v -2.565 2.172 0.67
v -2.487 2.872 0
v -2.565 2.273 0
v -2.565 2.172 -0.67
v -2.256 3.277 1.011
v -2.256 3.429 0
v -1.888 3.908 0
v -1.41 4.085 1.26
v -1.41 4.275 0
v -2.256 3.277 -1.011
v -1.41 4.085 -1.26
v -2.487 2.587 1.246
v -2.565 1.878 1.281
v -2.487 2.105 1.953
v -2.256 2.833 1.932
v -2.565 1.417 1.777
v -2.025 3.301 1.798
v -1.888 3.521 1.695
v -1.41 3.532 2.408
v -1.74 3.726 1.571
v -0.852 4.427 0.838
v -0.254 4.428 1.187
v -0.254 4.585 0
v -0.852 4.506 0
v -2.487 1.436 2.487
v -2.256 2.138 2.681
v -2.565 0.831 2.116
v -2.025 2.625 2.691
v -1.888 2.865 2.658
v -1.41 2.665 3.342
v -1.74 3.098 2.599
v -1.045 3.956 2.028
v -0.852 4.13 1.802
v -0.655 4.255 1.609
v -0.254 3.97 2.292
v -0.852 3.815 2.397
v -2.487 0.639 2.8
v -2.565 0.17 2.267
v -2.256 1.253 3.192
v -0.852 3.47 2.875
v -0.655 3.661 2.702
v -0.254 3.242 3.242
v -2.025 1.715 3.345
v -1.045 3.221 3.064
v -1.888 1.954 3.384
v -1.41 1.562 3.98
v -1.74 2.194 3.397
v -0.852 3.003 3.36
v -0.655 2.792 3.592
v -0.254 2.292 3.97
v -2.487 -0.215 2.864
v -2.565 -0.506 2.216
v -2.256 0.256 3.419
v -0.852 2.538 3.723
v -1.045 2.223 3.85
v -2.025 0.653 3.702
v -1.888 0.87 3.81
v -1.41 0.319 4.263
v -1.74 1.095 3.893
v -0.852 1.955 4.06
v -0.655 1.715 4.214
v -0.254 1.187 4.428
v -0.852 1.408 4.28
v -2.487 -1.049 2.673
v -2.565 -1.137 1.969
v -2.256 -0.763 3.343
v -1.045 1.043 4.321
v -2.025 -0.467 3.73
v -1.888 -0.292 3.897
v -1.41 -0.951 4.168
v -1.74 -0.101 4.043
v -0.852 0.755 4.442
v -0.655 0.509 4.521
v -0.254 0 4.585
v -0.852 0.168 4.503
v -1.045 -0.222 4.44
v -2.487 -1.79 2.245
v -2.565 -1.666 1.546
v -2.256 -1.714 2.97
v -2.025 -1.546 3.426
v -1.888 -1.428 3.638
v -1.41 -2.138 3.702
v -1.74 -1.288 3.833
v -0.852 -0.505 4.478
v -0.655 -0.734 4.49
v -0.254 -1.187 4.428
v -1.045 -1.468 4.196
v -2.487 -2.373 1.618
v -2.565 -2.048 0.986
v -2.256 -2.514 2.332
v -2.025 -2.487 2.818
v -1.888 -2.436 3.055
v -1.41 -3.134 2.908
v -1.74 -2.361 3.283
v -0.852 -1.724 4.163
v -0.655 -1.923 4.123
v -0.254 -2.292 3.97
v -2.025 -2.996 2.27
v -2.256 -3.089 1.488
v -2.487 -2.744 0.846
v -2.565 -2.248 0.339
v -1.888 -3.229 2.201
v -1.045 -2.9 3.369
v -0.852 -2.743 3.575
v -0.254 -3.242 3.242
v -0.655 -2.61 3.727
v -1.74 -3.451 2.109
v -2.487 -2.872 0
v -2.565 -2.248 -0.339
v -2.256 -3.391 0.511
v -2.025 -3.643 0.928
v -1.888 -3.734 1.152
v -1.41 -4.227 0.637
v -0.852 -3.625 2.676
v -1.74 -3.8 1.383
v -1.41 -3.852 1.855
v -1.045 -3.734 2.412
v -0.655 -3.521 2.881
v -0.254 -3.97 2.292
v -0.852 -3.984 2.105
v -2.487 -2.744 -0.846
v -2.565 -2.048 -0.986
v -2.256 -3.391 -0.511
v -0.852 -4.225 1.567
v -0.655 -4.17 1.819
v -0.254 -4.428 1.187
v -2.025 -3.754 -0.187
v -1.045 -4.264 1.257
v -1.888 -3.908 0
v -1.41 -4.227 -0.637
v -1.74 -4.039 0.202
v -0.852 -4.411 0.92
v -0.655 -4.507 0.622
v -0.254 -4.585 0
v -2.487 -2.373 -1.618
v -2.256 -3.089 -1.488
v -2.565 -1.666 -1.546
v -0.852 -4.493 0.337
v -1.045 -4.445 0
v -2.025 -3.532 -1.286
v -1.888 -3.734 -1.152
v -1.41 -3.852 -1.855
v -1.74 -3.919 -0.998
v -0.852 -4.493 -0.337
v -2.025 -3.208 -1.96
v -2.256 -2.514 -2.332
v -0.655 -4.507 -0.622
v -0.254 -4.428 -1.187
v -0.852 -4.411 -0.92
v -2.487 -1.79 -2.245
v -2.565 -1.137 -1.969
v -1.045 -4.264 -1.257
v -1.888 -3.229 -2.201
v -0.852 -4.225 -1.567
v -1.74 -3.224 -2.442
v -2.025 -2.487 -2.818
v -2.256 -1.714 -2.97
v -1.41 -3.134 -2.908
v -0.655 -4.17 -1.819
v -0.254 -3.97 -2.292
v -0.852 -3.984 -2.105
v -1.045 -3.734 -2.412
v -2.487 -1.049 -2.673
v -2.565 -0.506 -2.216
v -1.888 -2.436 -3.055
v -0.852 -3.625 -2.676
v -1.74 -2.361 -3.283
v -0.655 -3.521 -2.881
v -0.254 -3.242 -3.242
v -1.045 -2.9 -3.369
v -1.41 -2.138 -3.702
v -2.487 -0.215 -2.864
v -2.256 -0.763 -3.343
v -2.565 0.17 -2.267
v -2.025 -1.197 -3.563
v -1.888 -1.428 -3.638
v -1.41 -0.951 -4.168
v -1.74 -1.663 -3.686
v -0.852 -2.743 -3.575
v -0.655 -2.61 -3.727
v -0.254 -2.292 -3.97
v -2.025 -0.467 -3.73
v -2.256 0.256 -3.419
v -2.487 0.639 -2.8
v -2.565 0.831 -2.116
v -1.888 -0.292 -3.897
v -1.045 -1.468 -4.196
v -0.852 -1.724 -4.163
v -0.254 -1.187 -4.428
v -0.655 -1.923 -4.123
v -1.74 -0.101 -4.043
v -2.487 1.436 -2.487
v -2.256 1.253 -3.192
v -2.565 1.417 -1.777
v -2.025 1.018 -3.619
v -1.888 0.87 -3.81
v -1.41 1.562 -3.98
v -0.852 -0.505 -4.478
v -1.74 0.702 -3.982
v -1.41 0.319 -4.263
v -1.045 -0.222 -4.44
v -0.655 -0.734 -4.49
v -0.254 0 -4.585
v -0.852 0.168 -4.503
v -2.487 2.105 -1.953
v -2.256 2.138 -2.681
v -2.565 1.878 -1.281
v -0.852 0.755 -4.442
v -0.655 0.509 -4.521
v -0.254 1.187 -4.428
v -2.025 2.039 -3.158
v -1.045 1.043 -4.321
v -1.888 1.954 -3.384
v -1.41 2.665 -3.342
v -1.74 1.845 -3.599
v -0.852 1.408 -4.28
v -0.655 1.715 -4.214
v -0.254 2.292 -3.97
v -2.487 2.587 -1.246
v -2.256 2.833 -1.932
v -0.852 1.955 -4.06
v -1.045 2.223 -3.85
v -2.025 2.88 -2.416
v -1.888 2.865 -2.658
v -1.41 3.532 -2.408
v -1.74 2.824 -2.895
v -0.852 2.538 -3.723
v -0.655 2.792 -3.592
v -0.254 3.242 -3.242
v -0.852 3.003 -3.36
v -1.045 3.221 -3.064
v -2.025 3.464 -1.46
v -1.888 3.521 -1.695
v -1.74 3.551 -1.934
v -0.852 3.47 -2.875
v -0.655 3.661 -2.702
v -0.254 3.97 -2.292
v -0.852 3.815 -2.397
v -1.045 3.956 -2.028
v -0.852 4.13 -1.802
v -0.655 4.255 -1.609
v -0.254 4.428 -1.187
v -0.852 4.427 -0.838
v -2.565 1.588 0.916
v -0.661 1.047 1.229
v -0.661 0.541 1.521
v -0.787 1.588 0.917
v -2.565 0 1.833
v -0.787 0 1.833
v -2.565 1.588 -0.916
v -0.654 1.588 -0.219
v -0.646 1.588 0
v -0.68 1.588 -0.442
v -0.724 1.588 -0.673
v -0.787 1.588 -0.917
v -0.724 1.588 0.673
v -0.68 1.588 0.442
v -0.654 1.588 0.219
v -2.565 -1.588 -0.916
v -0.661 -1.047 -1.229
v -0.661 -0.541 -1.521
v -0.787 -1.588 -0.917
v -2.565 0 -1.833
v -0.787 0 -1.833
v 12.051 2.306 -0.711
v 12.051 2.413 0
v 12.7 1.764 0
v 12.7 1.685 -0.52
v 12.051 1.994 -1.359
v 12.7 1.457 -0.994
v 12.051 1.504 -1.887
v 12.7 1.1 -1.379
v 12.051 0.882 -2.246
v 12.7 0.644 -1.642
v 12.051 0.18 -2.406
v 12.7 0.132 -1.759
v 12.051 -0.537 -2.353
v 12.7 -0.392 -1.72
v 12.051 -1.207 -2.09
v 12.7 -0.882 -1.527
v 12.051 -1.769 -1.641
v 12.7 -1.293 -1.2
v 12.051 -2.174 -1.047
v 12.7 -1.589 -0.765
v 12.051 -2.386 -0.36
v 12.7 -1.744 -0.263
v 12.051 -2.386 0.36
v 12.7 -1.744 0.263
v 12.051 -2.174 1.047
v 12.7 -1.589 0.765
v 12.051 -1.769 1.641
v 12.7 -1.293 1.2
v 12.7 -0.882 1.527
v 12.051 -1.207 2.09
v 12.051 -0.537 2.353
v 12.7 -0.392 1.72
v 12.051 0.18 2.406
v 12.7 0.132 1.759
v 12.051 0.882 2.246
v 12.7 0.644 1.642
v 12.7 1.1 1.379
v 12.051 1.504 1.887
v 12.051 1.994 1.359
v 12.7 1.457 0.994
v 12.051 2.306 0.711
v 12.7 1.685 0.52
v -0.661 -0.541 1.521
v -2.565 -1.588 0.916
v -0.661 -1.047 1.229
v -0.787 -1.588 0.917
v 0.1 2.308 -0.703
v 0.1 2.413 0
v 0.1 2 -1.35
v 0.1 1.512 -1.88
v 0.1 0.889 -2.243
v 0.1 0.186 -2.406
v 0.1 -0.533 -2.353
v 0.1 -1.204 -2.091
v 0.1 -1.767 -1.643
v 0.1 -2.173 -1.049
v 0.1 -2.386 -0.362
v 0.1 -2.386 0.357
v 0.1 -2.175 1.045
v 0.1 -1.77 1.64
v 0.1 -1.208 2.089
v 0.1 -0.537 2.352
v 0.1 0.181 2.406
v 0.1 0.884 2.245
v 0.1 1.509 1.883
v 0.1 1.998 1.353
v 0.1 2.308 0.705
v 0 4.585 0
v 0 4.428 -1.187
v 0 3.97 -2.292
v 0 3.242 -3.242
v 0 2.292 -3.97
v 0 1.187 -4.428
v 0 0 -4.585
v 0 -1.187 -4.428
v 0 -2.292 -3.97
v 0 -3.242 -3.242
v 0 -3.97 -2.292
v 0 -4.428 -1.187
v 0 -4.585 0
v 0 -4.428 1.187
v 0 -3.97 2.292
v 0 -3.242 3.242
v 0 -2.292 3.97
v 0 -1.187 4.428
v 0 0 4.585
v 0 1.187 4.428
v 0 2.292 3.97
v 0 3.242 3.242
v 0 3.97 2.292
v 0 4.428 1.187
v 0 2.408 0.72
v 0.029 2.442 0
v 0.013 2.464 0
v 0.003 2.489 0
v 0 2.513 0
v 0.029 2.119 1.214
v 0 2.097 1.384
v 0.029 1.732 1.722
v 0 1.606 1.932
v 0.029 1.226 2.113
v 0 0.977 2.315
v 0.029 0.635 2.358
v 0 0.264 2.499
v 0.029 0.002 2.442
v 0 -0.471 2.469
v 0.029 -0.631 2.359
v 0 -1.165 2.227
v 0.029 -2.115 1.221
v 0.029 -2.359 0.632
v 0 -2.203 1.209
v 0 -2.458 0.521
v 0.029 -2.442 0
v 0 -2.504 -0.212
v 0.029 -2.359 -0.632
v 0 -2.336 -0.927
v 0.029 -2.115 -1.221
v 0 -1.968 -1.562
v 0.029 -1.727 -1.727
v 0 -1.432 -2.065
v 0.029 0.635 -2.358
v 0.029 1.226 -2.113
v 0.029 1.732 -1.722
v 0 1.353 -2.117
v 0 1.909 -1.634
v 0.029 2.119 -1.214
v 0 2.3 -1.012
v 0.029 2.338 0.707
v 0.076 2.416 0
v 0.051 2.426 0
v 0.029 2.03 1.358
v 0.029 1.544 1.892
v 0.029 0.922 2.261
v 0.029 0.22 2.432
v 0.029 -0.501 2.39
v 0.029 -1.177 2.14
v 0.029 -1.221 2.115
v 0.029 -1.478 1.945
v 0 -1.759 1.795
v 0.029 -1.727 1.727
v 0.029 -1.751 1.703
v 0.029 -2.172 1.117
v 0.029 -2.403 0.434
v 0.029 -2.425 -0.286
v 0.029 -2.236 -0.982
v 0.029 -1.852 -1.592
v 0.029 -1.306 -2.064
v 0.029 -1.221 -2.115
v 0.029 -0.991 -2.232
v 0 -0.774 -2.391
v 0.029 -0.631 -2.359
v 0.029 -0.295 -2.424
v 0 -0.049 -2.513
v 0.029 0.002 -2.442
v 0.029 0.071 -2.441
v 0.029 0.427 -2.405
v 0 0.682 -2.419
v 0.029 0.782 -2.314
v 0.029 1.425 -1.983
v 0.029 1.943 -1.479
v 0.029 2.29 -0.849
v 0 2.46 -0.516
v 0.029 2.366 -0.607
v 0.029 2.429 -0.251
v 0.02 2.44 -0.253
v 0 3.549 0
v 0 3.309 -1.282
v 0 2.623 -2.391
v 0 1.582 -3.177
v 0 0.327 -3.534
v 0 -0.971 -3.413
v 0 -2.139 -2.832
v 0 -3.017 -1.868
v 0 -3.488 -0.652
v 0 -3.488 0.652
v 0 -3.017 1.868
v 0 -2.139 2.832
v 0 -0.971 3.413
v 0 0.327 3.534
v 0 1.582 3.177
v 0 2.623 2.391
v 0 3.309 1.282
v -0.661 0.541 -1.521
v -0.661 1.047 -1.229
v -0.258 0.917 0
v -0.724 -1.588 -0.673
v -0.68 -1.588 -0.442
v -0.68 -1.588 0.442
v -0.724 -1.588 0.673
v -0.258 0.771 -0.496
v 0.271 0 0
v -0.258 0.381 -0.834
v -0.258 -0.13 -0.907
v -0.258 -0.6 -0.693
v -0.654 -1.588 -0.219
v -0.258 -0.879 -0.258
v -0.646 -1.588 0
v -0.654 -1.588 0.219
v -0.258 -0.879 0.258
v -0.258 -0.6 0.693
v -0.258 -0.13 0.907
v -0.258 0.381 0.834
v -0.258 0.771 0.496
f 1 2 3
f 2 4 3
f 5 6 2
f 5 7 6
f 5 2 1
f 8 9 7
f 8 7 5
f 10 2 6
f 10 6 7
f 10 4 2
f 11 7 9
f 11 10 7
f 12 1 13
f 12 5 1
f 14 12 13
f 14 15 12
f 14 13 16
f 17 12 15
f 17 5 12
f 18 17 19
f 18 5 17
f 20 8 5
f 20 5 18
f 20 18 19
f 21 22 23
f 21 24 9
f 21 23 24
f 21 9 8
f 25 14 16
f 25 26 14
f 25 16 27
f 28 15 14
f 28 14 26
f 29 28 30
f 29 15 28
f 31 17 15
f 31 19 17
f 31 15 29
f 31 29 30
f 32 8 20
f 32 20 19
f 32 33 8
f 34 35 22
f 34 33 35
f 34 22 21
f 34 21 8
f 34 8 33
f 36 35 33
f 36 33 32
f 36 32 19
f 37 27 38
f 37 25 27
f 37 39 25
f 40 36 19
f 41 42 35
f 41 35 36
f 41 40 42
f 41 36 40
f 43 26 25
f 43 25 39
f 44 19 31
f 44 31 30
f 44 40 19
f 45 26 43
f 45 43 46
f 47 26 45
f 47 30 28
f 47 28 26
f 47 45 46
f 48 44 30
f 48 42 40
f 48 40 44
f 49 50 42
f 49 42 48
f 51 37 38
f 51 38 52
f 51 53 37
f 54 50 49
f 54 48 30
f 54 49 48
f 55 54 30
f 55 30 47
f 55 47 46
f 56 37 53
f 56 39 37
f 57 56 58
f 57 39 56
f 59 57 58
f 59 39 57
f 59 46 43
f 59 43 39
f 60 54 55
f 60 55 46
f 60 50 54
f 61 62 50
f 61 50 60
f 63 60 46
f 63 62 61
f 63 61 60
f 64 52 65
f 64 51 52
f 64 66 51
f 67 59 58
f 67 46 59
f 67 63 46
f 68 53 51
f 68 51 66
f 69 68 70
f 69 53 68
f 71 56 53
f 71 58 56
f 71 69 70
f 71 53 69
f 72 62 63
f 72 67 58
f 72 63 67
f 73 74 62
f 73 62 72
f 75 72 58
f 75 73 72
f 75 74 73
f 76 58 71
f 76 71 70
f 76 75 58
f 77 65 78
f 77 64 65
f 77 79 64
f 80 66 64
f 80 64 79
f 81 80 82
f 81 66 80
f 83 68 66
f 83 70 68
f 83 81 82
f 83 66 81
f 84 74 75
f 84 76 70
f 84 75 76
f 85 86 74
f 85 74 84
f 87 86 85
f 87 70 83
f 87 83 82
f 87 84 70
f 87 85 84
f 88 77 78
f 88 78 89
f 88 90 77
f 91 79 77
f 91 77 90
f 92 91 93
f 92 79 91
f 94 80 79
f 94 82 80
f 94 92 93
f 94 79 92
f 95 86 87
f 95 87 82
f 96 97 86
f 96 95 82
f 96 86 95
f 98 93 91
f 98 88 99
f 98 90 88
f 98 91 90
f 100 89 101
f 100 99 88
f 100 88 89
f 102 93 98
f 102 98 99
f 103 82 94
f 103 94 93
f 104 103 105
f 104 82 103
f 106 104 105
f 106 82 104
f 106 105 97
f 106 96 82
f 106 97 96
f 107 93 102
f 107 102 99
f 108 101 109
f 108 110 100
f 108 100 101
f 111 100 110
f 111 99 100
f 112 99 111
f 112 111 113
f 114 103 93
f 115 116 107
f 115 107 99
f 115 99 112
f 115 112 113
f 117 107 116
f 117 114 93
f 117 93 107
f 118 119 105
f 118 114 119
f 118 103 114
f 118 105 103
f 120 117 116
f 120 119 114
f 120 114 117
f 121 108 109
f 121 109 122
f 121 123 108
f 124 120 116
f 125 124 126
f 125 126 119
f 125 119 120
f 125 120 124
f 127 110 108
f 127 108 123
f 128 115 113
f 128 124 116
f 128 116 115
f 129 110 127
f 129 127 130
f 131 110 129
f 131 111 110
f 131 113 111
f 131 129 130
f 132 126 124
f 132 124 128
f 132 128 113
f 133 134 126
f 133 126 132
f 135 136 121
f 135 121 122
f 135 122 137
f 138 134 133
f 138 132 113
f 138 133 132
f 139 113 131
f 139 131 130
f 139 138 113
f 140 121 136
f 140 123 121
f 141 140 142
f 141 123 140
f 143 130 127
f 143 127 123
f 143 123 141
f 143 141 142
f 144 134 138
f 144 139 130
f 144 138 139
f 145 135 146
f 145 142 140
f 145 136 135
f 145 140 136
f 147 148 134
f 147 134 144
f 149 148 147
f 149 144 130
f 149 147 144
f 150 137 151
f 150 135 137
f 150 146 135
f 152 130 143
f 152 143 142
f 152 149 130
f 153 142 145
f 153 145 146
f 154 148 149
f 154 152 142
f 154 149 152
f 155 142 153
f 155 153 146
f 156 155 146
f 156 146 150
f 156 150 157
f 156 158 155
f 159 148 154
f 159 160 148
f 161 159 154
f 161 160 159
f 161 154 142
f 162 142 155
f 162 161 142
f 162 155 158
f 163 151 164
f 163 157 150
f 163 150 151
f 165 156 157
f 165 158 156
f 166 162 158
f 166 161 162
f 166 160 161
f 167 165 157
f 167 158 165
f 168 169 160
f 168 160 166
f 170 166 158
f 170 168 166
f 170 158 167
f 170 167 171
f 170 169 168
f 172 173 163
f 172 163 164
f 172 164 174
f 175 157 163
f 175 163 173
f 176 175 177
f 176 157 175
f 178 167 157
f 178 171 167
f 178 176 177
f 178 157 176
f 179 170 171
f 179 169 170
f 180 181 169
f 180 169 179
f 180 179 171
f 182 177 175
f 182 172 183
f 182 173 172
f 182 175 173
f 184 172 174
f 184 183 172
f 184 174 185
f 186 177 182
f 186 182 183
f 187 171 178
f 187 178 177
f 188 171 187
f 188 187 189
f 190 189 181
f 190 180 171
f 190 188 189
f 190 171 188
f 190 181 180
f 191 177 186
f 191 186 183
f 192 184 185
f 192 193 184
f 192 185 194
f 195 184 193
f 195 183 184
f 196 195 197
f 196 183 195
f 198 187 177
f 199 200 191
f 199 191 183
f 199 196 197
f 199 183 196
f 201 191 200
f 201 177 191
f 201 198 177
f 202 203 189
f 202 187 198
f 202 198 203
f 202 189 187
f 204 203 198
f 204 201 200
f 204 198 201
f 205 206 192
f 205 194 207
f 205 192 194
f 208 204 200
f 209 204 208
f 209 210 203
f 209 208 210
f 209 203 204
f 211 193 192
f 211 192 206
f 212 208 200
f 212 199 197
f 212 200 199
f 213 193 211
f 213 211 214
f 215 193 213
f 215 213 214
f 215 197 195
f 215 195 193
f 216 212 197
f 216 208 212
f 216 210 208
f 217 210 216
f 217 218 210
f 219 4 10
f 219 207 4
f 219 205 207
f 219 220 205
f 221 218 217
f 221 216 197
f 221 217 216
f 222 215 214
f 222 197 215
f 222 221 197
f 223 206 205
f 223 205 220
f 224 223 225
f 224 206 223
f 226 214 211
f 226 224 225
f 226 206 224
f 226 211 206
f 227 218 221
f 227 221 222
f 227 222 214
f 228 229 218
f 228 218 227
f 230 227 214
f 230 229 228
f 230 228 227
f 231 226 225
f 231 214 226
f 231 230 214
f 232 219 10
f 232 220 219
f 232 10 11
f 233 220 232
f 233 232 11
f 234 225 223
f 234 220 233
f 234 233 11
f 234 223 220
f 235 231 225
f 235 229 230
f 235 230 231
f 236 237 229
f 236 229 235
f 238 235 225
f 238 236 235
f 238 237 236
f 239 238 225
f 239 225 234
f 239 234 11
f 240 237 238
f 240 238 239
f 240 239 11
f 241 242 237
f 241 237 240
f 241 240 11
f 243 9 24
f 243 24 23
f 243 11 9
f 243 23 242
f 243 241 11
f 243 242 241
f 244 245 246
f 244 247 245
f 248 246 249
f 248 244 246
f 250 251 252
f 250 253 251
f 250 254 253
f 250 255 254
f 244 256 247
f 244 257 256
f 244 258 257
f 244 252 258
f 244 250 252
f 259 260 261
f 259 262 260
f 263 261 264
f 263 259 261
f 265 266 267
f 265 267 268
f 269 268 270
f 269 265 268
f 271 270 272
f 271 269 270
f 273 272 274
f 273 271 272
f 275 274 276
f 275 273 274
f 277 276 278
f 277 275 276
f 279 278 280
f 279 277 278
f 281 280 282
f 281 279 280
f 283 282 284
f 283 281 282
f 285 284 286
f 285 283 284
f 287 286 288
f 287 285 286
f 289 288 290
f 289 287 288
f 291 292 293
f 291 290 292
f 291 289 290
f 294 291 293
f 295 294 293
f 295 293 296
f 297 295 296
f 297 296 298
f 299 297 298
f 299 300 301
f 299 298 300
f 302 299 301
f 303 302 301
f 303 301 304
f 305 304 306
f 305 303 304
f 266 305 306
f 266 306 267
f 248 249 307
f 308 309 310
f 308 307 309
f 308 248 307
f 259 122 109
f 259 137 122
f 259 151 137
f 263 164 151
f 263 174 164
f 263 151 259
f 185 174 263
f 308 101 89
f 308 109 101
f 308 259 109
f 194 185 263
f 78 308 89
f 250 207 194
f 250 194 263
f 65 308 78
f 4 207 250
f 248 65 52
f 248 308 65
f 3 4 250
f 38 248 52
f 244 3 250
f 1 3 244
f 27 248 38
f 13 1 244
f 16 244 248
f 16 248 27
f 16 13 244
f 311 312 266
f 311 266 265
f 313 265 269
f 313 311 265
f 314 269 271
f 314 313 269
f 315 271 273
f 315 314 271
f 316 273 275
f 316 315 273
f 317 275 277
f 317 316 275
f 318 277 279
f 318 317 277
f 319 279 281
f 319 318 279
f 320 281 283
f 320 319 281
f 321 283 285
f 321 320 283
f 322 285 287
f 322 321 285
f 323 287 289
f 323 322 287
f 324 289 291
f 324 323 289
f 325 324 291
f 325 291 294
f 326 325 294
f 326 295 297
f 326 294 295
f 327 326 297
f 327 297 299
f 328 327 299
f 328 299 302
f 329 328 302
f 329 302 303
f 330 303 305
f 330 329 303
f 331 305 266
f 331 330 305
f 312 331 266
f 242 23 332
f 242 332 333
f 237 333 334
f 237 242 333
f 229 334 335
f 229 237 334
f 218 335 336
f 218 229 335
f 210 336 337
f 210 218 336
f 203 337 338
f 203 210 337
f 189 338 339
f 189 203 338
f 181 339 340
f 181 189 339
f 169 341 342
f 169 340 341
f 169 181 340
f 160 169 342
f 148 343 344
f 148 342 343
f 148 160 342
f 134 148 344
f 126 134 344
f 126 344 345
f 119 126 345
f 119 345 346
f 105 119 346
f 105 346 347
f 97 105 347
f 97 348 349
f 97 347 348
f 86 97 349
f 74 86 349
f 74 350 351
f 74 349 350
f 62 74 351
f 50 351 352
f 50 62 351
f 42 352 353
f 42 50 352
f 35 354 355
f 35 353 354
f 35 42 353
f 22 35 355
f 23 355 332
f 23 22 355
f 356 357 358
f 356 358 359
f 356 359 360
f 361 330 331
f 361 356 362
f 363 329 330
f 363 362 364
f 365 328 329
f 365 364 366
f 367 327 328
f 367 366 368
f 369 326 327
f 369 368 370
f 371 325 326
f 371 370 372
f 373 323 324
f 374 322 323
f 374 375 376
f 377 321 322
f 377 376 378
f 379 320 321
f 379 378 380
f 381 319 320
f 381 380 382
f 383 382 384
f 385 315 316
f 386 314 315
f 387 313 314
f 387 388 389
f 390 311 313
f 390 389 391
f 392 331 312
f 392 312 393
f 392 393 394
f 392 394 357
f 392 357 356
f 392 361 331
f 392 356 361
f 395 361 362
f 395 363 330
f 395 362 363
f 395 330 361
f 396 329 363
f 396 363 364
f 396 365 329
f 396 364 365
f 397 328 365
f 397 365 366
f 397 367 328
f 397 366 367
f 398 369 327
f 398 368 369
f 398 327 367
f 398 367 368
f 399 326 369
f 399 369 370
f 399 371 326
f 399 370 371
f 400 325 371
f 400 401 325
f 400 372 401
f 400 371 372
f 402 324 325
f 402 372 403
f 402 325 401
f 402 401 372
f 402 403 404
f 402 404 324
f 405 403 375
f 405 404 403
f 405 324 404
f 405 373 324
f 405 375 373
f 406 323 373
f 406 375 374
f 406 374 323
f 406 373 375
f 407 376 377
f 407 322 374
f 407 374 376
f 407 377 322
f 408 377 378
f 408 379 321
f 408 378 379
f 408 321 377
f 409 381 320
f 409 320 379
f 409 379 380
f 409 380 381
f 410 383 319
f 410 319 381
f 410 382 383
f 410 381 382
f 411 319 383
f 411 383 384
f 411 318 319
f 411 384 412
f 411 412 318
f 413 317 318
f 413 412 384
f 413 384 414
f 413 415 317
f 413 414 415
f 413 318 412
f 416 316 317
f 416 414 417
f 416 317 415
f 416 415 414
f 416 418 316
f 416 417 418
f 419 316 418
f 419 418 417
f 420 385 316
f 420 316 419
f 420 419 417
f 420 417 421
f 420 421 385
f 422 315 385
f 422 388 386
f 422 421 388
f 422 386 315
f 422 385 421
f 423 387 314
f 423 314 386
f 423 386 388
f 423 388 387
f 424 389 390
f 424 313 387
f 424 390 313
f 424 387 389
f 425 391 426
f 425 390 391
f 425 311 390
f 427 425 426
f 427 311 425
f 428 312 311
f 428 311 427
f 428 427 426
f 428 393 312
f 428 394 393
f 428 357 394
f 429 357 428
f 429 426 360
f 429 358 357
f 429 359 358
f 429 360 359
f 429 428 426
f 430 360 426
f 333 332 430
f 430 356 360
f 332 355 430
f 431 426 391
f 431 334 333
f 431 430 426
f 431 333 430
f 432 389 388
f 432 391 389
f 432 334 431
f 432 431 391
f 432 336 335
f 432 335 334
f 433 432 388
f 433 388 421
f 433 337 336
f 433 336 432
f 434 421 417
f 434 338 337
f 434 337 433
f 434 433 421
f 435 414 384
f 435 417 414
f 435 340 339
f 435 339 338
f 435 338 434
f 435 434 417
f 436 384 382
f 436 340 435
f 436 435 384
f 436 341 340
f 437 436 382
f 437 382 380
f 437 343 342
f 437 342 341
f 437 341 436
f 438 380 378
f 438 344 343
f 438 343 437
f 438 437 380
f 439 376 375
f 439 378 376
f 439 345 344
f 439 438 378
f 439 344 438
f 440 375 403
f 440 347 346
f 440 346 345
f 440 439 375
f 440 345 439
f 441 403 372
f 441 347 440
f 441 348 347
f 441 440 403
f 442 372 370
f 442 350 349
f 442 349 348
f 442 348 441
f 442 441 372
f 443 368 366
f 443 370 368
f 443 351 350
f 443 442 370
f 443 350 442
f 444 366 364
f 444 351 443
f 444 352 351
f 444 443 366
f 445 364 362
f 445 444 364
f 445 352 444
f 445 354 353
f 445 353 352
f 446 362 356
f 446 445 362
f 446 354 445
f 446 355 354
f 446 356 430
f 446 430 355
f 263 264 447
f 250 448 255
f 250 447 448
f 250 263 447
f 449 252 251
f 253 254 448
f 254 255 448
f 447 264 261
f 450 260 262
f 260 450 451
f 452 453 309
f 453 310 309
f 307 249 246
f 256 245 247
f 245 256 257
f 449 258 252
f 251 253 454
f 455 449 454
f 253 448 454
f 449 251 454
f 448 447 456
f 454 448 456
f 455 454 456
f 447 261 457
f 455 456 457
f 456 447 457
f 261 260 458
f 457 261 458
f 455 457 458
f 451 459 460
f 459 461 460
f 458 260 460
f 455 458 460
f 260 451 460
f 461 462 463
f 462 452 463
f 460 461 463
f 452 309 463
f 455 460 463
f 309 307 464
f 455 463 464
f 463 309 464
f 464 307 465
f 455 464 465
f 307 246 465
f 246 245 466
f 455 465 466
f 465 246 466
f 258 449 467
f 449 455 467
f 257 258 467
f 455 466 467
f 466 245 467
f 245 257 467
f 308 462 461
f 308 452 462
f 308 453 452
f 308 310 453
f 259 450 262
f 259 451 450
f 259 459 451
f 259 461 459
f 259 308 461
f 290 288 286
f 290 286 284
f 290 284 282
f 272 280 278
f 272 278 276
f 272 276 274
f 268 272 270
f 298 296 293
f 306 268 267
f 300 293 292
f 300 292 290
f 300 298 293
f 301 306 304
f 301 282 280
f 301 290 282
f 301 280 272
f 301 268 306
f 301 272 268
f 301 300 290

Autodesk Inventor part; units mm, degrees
ref_plane "YZ Plane" through (0, 0, 0) normal (1, 0, 0) x (0, 1, 0)
ref_plane "XZ Plane" through (0, 0, 0) normal (0, 1, 0) x (-1, 0, 0)
sketch "Sketch1" plane through (0, 0, 0) normal (0, 0, 1) x (1, 0, 0)
  line L0 (0.2709, 0) -> (12.7, 0)
  line L1 (12.7, 0) -> (12.7, 2.413)
  line L2 (12.7, 2.413) -> (2.1084, 2.413)
  line L3 (2.1084, 2.413) -> (0.0001, 2.413)
  line L4 (0.0001, 2.413) -> (0, 2.413)
  line L5 (0, 2.413) -> (0, 4.5847)
  line L6 (0, 4.5847) -> (-2.5654, 4.5847)
  line L7 (-2.5654, 4.5847) -> (-2.5654, 1.8331)
  line L8 (-2.5654, 1.8331) -> (-0.7874, 1.8331)
  line L9 (-0.7874, 1.8331) -> (0.2709, 0)
  line L10 (-5.6185, 0) -> (15.7531, 0) projected
  line L11 (0, -0.9169) -> (0, 5.5016) projected
  line L12 (2.1084, 2.413) -> (0, 2.413) construction
  dimension "d1" = 10.5916
  dimension "d2" = 2.1083
  dimension "d3" = 2.5654
  dimension "d4" = 1.778
  dimension "d5" = 60
  dimension "d6" = 4.826
  dimension "d7" = 4.826
  dimension "d8" = 3.6662
  dimension "d9" = 9.1694
  dimension "d26" = 12.7
revolve "Body" add sketch "Sketch1" angle 360 about axis through (0.2709, 0, 0) along (1, 0, 0) contours L9 L11 L3 L2 L1 L0 | L9 L8 L7 L6 L5 L11
sketch "Sketch2" plane through (-2.5654, 0, 0) normal (-1, 0, 0) x (0, 0, 1)
  circle A0 centre (0, 0) radius 1.8331 projected
  line L0 (0, -6.4186) -> (0, 6.4186) projected
  line L1 (-6.4186, 0) -> (6.4186, 0) projected
  line L2 (1.8331, 0) -> (0.9165, -1.5875)
  line L3 (0.9165, -1.5875) -> (-0.9165, -1.5875)
  line L4 (-0.9165, -1.5875) -> (-1.8331, 0)
  line L5 (-1.8331, 0) -> (-0.9165, 1.5875)
  line L6 (-0.9165, 1.5875) -> (0.9165, 1.5875)
  line L7 (0.9165, 1.5875) -> (1.8331, 0)
extrude "Slot" add sketch "Sketch2" against normal up to next contours L7 A0 | A0 L2 | L6 L0 A0 | A0 L0 L3 | L0 L6 A0 | A0 L3 L0 | L4 A0 | A0 L5
fillet "Fillet1" radius 2.3114 1 edges at (-2.5654, -4.5847, 0)
thread "Thread" size "10-24 UNC" class "2A" standard "ANSI Unified Screw Threads" length 10.5916
chamfer "Chamfer1" distance 0.6492 distance2 0.6492 1 edges at (12.7, -2.413, 0) measured on face at (12.7, -0.2686, 0.7084)
ref_plane "Work Plane1" through (29, 0, 0) normal (0, -1, 0) x (1, 0, 0)
fillet "Fillet2" radius 0.1 1 edges at (0.0001, -2.413, 0)
equation "\"d1\" = GEL"
equation "\"d3\" = KOH"
equation "\"d4\" = INTI"
equation "\"d6\" = GD"
equation "\"d7\" = BDM"
equation "\"d8\" = 1.1547 * SW"
equation "\"d9\" = KOD"
equation "\"d26\" = NLG"
equation "\"d30\" = R"
equation "\"d17\" = RR"
equation "\"d13\" = GEL"
equation "\"d15\" = -0.5 * SPD + 0.5 * GD"
equation "\"d16\" = GUL"
equation "\"GD\" = NND"
equation "\"NLG\" = 12.7"
equation "\"GEL\" = 10.5916"
equation "\"KOD\" = 9.1694"
equation "\"KOH\" = 2.5654"
equation "\"INTI\" = 1.778"
equation "\"GAL\" = 2.1082"
equation "\"GUL\" = 0.64922"
equation "\"BDM\" = NND"
equation "\"SW\" = 3.175"
equation "\"RR\" = 2.3114"
equation "\"SPD\" = 3.52755"
equation "\"R\" = 0.1"
equation "\"TOA\" = 30deg"
equation "\"GD1\" = SPD"
equation "\"THREADDIA\" = 4.826"
equation "\"KOH1\" = 0.508"
equation "\"NND\" = 4.826"
equation "\"E0\" = 3.66725"
properties part number "ANSI B18.3 - 10 - 24 x 1/2"
